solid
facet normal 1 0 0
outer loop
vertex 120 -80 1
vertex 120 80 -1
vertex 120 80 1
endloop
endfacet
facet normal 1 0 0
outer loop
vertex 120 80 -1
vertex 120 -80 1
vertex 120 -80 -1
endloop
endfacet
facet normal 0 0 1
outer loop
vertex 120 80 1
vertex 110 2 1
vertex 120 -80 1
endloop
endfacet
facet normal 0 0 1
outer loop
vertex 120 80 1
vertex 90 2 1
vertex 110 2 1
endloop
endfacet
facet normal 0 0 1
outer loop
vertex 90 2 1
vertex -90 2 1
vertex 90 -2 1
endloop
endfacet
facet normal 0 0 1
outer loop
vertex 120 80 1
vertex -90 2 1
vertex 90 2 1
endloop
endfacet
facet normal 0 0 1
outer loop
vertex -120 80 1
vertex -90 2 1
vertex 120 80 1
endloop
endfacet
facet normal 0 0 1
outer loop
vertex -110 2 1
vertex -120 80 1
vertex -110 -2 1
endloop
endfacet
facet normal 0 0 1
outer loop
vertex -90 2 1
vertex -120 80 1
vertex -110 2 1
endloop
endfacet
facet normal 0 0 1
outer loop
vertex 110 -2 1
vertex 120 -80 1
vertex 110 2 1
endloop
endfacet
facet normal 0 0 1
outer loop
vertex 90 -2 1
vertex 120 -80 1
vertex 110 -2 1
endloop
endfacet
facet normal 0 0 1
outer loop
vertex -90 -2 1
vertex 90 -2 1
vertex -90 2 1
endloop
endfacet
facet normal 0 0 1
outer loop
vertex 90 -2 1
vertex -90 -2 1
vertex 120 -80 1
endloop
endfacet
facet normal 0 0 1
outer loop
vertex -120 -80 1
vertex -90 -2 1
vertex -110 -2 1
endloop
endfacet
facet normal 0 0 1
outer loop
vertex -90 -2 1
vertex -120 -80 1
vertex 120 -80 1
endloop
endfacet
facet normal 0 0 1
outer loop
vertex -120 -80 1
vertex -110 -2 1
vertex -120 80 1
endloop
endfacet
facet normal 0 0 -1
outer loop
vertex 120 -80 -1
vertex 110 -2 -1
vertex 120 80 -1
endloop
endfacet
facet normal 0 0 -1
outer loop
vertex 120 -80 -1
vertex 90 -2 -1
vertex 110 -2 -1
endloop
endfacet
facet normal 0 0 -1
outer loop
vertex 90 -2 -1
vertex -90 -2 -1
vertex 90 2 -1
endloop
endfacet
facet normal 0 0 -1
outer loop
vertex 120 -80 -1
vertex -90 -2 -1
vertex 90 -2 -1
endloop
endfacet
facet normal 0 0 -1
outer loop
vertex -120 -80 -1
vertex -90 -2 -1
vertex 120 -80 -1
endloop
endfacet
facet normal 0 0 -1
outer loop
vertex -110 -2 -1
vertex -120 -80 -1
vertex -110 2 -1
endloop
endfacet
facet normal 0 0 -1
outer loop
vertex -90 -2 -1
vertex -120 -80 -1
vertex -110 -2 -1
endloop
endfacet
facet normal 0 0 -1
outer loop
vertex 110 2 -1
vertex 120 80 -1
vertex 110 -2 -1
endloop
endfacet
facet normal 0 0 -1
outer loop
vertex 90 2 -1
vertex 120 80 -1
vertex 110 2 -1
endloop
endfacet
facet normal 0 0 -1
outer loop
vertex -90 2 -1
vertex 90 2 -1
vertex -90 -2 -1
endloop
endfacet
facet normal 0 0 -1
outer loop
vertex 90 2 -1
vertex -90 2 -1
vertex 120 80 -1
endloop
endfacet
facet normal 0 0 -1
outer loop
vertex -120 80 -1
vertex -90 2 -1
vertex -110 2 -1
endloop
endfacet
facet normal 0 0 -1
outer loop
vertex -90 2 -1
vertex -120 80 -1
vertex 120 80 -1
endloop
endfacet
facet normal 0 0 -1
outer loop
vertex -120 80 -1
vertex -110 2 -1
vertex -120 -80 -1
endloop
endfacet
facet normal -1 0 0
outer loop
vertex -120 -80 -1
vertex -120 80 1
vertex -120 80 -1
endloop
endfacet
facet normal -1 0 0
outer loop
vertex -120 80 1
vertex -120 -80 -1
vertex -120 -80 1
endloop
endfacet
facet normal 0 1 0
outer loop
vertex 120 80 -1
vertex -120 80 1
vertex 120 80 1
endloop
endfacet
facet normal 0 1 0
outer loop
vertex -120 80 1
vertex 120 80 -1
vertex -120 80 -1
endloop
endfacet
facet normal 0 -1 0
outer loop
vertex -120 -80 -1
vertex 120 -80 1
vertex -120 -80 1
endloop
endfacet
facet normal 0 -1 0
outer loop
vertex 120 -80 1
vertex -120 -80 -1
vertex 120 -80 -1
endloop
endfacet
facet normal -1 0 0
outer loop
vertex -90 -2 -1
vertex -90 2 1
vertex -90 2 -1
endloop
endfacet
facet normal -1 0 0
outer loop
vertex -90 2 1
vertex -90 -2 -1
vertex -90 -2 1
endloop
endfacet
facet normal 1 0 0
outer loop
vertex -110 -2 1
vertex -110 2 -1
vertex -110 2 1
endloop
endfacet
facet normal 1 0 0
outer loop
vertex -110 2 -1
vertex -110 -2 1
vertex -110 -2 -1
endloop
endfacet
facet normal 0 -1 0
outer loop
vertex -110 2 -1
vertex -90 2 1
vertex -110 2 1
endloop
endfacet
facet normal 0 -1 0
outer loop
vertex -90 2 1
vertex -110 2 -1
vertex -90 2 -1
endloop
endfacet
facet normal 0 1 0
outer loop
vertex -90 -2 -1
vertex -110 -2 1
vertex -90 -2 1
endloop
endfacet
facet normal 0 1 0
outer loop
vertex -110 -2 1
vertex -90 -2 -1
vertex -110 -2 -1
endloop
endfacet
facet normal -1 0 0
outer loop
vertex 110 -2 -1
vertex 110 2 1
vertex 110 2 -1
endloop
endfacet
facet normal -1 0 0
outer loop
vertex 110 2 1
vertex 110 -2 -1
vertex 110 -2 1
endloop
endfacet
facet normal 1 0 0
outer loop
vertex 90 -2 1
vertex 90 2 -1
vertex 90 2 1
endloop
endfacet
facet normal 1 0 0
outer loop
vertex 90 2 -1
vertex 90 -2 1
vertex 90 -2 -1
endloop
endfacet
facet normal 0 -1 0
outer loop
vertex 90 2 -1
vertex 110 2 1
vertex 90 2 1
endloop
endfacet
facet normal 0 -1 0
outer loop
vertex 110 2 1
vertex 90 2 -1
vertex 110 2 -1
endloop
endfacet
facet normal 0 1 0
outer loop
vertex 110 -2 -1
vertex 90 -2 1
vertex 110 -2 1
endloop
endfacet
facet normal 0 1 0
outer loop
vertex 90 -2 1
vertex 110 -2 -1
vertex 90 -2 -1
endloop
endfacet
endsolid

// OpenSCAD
// ========================================
// a 240 x 160 x 2 mm plate with two 20 x 4 mm slots
// NeuroCAD canonical IR; dimensions are millimetres
// ========================================
$fn = 48;

difference() {
  cube(size=[240, 160, 2], center=true);
  translate([-100, 0, 0]) {
    cube(size=[20, 4, 4], center=true);
  }
  translate([100, 0, 0]) {
    cube(size=[20, 4, 4], center=true);
  }
}
